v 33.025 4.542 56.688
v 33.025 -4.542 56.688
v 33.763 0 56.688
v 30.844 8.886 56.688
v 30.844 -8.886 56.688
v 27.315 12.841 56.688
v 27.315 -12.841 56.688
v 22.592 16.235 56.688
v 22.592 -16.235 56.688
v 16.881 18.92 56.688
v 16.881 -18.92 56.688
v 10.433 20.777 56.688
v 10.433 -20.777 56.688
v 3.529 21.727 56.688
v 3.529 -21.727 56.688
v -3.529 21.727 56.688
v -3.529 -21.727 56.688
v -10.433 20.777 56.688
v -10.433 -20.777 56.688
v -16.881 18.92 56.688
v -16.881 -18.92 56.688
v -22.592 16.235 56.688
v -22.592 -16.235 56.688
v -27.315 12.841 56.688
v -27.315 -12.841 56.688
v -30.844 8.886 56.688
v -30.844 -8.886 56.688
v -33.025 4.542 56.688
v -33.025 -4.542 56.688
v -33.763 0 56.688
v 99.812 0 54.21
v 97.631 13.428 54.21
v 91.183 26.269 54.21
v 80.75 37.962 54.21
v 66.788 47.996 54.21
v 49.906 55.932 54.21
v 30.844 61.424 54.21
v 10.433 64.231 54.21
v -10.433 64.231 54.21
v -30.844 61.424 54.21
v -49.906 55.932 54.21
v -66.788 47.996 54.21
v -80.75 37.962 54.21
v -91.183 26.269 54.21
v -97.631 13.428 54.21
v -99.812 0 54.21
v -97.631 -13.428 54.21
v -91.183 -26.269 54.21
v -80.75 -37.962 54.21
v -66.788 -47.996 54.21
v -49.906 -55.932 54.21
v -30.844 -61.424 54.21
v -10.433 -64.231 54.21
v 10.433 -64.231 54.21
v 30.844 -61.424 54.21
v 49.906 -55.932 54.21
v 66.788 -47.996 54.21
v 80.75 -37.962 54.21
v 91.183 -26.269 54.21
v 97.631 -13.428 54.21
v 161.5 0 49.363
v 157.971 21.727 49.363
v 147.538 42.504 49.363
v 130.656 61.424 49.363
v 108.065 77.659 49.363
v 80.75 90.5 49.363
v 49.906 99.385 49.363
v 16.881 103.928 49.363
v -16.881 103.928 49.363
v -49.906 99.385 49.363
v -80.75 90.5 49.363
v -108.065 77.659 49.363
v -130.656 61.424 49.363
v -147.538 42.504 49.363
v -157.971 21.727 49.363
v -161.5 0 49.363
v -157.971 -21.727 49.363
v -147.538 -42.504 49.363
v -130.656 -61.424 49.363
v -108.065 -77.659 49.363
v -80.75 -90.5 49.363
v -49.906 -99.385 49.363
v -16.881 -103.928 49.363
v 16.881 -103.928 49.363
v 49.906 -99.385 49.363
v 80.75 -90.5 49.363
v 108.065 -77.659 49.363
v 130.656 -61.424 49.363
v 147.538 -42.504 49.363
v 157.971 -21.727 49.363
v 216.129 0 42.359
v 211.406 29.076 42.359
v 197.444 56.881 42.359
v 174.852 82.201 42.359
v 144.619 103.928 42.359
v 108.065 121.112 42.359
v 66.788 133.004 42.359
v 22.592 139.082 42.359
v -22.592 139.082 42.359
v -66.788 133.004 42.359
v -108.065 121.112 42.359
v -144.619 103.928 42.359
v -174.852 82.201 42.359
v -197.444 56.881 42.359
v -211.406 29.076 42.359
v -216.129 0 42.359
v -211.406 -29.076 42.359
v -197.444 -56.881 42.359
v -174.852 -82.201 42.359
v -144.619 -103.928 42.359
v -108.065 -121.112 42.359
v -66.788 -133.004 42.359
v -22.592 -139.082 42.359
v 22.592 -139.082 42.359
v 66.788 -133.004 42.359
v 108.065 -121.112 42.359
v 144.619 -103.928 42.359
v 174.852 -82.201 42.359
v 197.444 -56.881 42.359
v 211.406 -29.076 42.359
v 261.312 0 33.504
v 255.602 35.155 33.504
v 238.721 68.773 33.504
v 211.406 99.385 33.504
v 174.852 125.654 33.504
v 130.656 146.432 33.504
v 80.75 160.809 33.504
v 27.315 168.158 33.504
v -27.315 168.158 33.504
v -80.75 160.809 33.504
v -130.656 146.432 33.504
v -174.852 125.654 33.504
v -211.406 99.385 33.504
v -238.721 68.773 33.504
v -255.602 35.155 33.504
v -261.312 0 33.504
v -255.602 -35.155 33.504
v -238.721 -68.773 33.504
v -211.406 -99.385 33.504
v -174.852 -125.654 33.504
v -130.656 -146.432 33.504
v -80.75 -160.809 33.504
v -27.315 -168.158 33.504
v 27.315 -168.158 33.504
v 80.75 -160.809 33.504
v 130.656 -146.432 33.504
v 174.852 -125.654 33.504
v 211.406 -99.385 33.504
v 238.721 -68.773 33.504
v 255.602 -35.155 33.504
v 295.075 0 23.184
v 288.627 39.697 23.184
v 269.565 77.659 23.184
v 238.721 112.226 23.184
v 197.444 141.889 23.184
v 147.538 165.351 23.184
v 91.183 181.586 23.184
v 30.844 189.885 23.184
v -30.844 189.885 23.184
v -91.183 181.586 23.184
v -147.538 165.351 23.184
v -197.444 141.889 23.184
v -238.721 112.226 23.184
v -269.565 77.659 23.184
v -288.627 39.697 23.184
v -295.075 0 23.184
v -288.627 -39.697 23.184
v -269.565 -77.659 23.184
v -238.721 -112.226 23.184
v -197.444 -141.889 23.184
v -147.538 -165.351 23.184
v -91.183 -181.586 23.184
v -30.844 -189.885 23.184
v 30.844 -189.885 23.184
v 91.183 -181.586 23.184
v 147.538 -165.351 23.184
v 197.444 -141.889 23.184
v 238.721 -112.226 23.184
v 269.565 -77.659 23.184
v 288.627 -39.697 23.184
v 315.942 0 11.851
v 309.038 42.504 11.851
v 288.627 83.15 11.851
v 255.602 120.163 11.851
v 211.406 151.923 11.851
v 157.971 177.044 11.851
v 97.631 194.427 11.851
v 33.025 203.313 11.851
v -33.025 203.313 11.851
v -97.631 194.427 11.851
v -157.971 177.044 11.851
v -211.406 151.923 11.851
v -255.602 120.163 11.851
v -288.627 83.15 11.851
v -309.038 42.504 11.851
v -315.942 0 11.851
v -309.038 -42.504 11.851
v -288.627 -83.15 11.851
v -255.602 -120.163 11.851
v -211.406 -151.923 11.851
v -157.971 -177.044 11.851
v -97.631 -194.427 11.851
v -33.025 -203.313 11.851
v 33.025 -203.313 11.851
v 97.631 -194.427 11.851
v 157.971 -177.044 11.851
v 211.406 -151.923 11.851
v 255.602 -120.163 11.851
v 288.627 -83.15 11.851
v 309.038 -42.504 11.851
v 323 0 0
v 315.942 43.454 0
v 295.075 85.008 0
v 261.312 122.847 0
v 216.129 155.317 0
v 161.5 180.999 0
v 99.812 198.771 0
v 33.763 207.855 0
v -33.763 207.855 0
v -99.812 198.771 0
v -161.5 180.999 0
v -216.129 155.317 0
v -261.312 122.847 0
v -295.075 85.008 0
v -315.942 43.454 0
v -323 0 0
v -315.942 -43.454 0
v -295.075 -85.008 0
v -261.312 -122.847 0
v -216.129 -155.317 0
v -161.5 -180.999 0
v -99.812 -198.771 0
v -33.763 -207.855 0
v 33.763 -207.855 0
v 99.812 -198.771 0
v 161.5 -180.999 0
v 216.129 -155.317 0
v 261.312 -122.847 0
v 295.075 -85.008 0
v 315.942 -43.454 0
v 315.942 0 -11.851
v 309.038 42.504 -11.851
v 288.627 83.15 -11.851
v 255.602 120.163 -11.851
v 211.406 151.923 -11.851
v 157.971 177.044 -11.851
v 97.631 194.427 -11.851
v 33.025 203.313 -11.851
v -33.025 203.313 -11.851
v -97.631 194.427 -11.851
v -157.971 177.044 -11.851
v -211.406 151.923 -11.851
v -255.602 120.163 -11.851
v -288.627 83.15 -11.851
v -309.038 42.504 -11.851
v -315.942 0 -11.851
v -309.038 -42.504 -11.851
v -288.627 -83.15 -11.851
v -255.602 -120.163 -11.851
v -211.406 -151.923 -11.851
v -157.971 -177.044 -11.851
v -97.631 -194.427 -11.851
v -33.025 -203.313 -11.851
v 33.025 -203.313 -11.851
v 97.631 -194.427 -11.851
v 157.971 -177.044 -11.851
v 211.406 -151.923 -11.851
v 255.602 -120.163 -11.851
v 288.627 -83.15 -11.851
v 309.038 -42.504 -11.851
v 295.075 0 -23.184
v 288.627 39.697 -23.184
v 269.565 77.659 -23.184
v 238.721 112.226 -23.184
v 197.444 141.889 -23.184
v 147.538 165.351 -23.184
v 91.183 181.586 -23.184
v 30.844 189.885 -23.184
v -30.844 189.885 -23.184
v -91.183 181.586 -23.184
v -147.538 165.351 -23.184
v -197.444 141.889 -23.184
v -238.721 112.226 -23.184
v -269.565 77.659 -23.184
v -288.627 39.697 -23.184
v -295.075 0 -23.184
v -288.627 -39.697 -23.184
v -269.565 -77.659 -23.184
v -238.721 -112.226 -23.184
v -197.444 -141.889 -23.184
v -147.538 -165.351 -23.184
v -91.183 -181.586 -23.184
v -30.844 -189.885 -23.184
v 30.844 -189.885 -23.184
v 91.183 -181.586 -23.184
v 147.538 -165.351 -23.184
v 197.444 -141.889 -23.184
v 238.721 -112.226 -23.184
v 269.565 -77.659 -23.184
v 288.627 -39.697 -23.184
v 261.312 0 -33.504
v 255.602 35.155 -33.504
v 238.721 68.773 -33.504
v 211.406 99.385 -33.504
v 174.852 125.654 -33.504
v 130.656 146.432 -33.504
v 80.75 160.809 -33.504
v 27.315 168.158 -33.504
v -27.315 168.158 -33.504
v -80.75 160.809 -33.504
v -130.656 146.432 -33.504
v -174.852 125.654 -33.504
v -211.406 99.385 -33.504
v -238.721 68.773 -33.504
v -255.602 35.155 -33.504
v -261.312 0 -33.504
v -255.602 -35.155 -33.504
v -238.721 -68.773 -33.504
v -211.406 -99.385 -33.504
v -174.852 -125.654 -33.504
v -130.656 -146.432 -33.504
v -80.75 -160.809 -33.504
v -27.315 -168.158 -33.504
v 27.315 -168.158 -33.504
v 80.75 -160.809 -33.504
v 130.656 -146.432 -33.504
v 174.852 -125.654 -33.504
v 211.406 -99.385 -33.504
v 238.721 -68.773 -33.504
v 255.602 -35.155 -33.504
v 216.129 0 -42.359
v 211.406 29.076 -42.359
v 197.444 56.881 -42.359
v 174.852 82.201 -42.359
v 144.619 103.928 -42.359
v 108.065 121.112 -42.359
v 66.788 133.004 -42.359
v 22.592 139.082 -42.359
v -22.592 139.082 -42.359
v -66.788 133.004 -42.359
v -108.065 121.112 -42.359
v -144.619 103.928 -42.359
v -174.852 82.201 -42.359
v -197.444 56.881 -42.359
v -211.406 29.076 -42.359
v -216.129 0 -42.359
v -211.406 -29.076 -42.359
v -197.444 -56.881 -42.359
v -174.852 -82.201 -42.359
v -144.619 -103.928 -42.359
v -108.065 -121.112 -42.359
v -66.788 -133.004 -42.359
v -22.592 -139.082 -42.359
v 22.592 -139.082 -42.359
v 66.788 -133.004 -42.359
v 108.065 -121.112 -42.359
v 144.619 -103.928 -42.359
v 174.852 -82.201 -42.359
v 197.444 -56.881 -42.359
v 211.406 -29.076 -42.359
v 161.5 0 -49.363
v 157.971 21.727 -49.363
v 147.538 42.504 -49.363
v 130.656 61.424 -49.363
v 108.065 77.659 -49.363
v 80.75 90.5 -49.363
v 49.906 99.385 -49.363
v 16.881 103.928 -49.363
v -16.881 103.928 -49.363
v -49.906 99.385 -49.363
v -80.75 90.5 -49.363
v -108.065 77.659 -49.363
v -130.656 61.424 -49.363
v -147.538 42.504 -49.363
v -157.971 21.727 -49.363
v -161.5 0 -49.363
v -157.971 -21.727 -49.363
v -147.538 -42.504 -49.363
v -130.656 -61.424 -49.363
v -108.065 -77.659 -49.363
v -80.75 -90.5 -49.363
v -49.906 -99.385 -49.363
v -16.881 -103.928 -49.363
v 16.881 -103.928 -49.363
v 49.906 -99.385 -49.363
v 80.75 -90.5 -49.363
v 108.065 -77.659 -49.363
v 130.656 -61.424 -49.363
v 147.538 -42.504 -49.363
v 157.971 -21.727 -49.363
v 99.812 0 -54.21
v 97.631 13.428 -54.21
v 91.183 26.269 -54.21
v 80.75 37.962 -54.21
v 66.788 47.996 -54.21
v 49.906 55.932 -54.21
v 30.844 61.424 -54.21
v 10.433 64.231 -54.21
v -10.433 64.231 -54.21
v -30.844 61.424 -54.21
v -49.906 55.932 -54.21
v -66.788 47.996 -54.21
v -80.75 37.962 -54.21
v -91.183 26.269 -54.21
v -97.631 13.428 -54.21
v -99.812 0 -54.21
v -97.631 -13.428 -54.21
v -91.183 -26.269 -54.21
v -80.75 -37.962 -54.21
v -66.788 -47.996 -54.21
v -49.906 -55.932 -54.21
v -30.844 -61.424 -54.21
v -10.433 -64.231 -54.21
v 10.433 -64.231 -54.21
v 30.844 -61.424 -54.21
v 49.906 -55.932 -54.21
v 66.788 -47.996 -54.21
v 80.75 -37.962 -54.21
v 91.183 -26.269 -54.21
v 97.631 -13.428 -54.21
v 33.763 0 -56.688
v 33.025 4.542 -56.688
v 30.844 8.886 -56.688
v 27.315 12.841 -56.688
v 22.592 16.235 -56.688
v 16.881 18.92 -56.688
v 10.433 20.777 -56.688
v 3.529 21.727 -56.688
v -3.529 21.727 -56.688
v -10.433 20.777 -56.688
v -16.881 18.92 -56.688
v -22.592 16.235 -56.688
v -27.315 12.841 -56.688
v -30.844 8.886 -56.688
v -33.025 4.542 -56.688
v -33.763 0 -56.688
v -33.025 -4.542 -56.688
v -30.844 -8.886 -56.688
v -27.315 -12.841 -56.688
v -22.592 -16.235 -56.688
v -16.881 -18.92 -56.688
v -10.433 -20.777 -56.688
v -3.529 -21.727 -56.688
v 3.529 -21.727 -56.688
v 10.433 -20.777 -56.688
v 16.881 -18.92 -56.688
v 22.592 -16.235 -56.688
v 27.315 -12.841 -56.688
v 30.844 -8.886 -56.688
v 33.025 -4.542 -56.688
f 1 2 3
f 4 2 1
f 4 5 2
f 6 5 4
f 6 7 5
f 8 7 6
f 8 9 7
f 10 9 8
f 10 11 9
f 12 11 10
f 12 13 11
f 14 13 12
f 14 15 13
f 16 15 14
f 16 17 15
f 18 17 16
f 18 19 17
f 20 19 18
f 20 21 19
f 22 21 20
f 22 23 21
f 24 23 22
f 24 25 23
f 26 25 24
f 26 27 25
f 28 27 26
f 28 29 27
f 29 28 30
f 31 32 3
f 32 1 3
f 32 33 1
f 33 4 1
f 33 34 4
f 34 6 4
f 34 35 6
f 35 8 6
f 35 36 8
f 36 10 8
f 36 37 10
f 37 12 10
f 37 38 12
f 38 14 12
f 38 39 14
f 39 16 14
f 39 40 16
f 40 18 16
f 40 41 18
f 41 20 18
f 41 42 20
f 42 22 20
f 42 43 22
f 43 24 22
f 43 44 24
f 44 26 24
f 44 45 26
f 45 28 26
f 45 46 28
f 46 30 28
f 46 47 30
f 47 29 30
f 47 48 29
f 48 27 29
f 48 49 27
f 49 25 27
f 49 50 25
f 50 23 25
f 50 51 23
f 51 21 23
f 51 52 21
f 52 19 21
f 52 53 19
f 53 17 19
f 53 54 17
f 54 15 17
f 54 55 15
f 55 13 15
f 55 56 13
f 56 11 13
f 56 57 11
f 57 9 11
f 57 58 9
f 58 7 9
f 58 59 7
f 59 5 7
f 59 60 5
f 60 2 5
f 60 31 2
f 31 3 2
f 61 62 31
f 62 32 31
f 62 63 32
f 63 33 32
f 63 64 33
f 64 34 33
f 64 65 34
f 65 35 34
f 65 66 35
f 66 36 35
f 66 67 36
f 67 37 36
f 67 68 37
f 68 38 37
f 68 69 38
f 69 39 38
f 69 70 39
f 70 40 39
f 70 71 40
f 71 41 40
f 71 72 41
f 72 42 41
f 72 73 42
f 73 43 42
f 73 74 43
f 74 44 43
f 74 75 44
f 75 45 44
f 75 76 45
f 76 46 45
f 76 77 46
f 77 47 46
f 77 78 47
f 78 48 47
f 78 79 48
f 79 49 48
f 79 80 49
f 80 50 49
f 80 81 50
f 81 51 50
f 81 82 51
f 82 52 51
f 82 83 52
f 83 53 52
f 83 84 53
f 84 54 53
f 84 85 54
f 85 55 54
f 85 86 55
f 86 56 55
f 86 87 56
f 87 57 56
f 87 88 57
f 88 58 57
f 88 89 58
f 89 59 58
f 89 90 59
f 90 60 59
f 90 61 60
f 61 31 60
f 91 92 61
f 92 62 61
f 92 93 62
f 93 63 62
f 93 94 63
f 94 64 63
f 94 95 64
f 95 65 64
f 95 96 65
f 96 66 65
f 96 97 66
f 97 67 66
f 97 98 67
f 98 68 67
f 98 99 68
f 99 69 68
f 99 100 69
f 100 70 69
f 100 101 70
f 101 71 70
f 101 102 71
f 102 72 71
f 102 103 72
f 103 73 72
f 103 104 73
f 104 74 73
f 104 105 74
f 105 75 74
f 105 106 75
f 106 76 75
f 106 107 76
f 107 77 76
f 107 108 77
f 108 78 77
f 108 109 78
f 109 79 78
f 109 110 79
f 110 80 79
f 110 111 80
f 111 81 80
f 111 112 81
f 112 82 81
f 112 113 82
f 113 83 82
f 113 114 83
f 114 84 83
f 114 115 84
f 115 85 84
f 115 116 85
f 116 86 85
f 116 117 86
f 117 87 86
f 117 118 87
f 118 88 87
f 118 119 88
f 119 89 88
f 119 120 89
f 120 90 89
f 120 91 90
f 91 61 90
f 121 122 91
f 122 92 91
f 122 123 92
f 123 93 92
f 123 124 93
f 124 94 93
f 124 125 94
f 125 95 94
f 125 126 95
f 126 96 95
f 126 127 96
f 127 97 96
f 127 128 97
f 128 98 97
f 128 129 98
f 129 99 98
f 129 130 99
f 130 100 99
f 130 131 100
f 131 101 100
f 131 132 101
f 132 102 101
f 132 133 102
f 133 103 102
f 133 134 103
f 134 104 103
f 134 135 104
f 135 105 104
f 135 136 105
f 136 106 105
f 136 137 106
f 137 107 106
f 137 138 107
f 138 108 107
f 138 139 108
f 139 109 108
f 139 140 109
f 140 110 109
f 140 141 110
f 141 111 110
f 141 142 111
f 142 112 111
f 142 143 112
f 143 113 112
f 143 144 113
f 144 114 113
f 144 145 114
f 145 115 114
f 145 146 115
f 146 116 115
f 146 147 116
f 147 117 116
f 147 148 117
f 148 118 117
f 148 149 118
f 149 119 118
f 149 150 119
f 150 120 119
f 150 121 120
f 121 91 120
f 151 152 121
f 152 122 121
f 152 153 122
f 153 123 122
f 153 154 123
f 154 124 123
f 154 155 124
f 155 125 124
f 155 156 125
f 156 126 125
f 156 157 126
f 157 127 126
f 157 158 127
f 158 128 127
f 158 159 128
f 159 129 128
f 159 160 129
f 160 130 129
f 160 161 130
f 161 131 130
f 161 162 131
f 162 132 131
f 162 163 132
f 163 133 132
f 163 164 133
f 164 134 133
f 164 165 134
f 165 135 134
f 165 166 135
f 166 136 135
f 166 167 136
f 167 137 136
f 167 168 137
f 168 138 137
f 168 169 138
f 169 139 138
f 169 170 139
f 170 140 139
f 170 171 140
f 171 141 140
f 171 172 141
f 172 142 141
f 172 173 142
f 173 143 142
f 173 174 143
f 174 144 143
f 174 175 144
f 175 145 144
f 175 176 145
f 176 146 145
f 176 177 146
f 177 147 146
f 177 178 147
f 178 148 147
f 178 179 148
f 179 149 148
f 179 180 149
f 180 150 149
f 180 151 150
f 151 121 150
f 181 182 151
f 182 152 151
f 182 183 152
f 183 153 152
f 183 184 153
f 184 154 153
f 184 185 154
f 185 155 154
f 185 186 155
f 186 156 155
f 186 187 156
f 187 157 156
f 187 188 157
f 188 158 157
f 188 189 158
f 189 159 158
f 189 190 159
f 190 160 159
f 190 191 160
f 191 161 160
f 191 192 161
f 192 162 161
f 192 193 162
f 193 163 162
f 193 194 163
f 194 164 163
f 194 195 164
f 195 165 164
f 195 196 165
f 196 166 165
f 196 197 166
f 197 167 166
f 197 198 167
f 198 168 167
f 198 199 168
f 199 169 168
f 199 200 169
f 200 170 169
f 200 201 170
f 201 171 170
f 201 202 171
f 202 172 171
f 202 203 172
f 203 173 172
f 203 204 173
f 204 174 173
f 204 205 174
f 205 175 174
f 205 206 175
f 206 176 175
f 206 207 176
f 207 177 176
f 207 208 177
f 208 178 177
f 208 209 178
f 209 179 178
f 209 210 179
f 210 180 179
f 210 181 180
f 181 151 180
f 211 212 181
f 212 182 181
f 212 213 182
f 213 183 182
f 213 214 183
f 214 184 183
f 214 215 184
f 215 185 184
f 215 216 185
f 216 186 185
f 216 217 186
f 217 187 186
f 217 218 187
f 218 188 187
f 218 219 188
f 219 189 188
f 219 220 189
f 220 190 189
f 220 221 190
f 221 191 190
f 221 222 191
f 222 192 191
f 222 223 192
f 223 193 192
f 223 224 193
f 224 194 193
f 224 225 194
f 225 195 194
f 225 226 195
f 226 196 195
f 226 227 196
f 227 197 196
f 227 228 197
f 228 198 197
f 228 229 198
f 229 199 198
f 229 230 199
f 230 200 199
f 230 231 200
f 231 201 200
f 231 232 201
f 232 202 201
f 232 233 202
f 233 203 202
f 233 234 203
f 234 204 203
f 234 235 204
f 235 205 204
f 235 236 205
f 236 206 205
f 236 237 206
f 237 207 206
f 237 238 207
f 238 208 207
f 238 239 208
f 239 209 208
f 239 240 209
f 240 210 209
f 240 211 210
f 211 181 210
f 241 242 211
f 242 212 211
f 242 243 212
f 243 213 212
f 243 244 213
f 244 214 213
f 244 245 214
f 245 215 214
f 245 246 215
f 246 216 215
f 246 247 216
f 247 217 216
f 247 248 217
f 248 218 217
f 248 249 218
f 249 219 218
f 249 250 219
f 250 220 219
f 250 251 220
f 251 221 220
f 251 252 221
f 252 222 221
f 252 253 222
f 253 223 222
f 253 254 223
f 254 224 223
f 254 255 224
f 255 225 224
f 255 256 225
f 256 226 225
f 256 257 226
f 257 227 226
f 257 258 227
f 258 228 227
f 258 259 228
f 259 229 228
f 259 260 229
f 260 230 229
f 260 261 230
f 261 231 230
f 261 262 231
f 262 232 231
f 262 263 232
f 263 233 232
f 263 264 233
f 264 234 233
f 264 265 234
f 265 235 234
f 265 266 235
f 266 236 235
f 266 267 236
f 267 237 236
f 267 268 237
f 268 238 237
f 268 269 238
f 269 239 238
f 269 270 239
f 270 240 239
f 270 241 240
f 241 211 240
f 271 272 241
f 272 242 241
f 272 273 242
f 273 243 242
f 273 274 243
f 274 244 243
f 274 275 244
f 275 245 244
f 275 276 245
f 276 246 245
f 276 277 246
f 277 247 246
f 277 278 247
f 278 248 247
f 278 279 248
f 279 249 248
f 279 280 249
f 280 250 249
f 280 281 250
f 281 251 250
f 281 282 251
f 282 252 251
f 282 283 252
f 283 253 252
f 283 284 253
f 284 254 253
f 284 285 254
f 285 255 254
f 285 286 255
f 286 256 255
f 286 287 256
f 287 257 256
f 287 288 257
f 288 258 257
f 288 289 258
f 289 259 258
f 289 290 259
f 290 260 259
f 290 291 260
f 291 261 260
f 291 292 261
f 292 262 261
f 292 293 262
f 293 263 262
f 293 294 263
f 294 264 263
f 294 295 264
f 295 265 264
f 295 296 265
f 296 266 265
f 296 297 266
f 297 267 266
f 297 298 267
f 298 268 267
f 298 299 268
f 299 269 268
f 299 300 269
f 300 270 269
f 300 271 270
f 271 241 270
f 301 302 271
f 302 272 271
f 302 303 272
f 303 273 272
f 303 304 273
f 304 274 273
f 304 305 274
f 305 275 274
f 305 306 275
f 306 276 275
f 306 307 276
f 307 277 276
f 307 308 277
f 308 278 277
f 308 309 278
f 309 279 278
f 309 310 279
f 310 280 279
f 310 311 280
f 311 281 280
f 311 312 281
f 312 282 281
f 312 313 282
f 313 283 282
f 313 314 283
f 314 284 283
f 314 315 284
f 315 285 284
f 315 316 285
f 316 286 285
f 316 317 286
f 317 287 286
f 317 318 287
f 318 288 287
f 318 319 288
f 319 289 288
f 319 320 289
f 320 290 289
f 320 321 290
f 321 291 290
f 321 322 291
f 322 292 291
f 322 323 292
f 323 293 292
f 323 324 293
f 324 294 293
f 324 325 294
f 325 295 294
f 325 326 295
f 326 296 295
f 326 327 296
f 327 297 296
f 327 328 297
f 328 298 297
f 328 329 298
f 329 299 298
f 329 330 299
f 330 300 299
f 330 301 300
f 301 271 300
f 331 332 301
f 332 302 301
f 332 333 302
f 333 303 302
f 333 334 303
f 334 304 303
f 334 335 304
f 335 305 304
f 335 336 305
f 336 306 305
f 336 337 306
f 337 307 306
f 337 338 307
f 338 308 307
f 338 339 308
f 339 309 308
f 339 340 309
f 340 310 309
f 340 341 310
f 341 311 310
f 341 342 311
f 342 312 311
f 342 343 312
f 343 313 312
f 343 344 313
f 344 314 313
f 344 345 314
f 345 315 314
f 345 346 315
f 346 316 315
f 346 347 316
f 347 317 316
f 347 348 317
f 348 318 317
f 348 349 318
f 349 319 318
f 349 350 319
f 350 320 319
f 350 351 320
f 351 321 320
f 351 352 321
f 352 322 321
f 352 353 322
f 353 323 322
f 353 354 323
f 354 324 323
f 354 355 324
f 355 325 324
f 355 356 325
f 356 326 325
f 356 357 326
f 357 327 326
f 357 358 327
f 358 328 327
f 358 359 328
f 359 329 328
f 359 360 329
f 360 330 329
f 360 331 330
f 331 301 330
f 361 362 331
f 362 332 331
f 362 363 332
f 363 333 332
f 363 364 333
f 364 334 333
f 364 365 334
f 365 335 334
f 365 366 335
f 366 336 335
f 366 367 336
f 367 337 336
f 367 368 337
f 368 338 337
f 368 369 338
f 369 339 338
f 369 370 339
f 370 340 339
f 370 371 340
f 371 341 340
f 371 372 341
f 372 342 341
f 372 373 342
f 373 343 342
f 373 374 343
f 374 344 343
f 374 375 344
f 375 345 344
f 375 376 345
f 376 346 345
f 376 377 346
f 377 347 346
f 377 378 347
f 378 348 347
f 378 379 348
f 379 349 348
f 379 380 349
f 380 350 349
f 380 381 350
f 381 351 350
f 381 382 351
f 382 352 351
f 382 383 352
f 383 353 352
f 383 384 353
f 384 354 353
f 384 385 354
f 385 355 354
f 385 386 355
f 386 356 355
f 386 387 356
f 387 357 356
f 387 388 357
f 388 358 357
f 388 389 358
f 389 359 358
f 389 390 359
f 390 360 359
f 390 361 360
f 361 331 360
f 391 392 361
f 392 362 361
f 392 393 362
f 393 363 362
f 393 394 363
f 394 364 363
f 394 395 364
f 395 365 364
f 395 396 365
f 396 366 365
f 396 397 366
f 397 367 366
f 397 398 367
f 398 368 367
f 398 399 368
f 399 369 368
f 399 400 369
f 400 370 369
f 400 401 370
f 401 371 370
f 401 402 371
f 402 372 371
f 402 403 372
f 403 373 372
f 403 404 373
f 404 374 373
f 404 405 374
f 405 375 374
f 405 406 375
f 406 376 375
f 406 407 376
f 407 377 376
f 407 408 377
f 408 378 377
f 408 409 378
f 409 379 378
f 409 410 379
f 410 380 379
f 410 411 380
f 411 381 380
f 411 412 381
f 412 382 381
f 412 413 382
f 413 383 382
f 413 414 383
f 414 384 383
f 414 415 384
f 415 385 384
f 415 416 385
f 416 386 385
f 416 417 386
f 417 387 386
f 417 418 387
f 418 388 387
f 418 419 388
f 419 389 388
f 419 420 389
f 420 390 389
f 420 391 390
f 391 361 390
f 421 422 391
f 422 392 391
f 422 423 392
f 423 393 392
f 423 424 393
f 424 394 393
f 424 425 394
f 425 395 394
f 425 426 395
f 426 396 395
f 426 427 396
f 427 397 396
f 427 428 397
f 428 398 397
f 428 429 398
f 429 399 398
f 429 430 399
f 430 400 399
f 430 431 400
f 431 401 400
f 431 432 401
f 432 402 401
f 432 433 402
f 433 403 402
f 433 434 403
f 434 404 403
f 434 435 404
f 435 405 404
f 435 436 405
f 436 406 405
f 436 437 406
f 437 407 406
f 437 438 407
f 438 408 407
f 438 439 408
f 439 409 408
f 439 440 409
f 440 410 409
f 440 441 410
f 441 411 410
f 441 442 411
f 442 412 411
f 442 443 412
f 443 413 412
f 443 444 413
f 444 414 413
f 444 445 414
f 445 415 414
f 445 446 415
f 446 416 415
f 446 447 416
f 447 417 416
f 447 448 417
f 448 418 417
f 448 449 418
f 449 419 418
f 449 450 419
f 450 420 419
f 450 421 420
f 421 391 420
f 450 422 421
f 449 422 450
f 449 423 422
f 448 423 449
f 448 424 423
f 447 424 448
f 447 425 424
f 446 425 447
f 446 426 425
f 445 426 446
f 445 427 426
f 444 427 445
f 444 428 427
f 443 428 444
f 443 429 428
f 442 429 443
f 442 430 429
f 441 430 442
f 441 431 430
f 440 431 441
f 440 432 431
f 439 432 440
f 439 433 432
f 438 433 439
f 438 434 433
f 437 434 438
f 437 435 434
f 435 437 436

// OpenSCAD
// Generated by SolidPython 1.0.1 on 2020-07-29 00:46:53


scale(v = [17, 11, 3]) {
	sphere(r = 19);
}
/***********************************************
*********      SolidPython code:      **********
************************************************
 
# import packages: SolidPython
from solid import *
from solid.utils import *
from itertools import chain, combinations, permutations


class Resize:

    def __init__(self, scad_file):
        self.scad_file = scad_file
        #self.scad_file = import_scad(scad_file)
        # cone/cylinder param:
        self.r1 = 0
        self.r2 = 0
        self.h = 0
        # rectangular prism param:
        self.w = 0
        self.l = 0
        # ellipse param:
        self.r = 0

    # import OpenScad code (file name corresponds to shape)


    # classify shape + parameters
    def assign(self, param1, param2, param3):
        if self.scad_file == 'cone.scad':
            self.r1 = param1
            self.r2 = param2
            self.h = param3
        elif self.scad_file == 'cylinder.scad':
            self.r1 = param1
            self.r2 = param2
            self.h = param3
        elif self.scad_file == 'rectangularPrism.scad':
            self.h = param1
            self.l = param2
            self.w = param3
        else:
            self.r = param1
            self.h = param2

    # resize parameters
    def iterate(self):
        x = range(3, 20, 2)
        i = 1
        if self.scad_file == 'cone.scad':
            tempList = list(permutations(x, 2))
            for temp in tempList:
                param1 = temp[0]
                param2 = temp[1]
                filepath = 'produced_scad_files/' + 'cone' + str(param1) + '_' + str(param2) + '_' + '.scad'
                scad_render_to_file(cylinder(h=param1, r1=param2, r2=0), filepath)

        elif self.scad_file == 'cylinder.scad':
            tempList = list(permutations(x, 3))
            for temp in tempList:
                param1 = temp[0]
                param2 = temp[1]
                filepath = 'produced_scad_files/' + 'cylinder' + str(param1) + '_' + str(param2) + '_' + '.scad'
                scad_render_to_file(cylinder(h=param1, r1=param2, r2=param2), filepath)

        elif self.scad_file == 'rectangularPrism.scad':
            tempList = list(permutations(x, 3))
            for temp in tempList:
                param1 = temp[0]
                param2 = temp[1]
                param3 = temp[2]
                filepath = 'produced_scad_files/' + 'rectangularPrism' + str(param1) + '_' + str(param2) + '_' + str(
                    param3) + '.scad'
                scad_render_to_file(cube(size=(param1, param2, param3)), filepath)

        elif self.scad_file == 'ellipse.scad':
            tempList = list(permutations(x, 4))
            for temp in tempList:
                param1 = temp[0]
                param2 = temp[1]
                param3 = temp[2]
                param4 = temp[3]
                filepath = 'produced_scad_files/' + 'ellipse' + str(param1) + '_' + str(param2) + '_' + str(param3) + '_' + str(param4) + '.scad'
                scad_render_to_file(scale([param1, param2, param3])(sphere(r=param4)), filepath)

    def render_to_scadfile(self):
        scad_render_to_file(scad, 'example.scad') 
 
************************************************/
